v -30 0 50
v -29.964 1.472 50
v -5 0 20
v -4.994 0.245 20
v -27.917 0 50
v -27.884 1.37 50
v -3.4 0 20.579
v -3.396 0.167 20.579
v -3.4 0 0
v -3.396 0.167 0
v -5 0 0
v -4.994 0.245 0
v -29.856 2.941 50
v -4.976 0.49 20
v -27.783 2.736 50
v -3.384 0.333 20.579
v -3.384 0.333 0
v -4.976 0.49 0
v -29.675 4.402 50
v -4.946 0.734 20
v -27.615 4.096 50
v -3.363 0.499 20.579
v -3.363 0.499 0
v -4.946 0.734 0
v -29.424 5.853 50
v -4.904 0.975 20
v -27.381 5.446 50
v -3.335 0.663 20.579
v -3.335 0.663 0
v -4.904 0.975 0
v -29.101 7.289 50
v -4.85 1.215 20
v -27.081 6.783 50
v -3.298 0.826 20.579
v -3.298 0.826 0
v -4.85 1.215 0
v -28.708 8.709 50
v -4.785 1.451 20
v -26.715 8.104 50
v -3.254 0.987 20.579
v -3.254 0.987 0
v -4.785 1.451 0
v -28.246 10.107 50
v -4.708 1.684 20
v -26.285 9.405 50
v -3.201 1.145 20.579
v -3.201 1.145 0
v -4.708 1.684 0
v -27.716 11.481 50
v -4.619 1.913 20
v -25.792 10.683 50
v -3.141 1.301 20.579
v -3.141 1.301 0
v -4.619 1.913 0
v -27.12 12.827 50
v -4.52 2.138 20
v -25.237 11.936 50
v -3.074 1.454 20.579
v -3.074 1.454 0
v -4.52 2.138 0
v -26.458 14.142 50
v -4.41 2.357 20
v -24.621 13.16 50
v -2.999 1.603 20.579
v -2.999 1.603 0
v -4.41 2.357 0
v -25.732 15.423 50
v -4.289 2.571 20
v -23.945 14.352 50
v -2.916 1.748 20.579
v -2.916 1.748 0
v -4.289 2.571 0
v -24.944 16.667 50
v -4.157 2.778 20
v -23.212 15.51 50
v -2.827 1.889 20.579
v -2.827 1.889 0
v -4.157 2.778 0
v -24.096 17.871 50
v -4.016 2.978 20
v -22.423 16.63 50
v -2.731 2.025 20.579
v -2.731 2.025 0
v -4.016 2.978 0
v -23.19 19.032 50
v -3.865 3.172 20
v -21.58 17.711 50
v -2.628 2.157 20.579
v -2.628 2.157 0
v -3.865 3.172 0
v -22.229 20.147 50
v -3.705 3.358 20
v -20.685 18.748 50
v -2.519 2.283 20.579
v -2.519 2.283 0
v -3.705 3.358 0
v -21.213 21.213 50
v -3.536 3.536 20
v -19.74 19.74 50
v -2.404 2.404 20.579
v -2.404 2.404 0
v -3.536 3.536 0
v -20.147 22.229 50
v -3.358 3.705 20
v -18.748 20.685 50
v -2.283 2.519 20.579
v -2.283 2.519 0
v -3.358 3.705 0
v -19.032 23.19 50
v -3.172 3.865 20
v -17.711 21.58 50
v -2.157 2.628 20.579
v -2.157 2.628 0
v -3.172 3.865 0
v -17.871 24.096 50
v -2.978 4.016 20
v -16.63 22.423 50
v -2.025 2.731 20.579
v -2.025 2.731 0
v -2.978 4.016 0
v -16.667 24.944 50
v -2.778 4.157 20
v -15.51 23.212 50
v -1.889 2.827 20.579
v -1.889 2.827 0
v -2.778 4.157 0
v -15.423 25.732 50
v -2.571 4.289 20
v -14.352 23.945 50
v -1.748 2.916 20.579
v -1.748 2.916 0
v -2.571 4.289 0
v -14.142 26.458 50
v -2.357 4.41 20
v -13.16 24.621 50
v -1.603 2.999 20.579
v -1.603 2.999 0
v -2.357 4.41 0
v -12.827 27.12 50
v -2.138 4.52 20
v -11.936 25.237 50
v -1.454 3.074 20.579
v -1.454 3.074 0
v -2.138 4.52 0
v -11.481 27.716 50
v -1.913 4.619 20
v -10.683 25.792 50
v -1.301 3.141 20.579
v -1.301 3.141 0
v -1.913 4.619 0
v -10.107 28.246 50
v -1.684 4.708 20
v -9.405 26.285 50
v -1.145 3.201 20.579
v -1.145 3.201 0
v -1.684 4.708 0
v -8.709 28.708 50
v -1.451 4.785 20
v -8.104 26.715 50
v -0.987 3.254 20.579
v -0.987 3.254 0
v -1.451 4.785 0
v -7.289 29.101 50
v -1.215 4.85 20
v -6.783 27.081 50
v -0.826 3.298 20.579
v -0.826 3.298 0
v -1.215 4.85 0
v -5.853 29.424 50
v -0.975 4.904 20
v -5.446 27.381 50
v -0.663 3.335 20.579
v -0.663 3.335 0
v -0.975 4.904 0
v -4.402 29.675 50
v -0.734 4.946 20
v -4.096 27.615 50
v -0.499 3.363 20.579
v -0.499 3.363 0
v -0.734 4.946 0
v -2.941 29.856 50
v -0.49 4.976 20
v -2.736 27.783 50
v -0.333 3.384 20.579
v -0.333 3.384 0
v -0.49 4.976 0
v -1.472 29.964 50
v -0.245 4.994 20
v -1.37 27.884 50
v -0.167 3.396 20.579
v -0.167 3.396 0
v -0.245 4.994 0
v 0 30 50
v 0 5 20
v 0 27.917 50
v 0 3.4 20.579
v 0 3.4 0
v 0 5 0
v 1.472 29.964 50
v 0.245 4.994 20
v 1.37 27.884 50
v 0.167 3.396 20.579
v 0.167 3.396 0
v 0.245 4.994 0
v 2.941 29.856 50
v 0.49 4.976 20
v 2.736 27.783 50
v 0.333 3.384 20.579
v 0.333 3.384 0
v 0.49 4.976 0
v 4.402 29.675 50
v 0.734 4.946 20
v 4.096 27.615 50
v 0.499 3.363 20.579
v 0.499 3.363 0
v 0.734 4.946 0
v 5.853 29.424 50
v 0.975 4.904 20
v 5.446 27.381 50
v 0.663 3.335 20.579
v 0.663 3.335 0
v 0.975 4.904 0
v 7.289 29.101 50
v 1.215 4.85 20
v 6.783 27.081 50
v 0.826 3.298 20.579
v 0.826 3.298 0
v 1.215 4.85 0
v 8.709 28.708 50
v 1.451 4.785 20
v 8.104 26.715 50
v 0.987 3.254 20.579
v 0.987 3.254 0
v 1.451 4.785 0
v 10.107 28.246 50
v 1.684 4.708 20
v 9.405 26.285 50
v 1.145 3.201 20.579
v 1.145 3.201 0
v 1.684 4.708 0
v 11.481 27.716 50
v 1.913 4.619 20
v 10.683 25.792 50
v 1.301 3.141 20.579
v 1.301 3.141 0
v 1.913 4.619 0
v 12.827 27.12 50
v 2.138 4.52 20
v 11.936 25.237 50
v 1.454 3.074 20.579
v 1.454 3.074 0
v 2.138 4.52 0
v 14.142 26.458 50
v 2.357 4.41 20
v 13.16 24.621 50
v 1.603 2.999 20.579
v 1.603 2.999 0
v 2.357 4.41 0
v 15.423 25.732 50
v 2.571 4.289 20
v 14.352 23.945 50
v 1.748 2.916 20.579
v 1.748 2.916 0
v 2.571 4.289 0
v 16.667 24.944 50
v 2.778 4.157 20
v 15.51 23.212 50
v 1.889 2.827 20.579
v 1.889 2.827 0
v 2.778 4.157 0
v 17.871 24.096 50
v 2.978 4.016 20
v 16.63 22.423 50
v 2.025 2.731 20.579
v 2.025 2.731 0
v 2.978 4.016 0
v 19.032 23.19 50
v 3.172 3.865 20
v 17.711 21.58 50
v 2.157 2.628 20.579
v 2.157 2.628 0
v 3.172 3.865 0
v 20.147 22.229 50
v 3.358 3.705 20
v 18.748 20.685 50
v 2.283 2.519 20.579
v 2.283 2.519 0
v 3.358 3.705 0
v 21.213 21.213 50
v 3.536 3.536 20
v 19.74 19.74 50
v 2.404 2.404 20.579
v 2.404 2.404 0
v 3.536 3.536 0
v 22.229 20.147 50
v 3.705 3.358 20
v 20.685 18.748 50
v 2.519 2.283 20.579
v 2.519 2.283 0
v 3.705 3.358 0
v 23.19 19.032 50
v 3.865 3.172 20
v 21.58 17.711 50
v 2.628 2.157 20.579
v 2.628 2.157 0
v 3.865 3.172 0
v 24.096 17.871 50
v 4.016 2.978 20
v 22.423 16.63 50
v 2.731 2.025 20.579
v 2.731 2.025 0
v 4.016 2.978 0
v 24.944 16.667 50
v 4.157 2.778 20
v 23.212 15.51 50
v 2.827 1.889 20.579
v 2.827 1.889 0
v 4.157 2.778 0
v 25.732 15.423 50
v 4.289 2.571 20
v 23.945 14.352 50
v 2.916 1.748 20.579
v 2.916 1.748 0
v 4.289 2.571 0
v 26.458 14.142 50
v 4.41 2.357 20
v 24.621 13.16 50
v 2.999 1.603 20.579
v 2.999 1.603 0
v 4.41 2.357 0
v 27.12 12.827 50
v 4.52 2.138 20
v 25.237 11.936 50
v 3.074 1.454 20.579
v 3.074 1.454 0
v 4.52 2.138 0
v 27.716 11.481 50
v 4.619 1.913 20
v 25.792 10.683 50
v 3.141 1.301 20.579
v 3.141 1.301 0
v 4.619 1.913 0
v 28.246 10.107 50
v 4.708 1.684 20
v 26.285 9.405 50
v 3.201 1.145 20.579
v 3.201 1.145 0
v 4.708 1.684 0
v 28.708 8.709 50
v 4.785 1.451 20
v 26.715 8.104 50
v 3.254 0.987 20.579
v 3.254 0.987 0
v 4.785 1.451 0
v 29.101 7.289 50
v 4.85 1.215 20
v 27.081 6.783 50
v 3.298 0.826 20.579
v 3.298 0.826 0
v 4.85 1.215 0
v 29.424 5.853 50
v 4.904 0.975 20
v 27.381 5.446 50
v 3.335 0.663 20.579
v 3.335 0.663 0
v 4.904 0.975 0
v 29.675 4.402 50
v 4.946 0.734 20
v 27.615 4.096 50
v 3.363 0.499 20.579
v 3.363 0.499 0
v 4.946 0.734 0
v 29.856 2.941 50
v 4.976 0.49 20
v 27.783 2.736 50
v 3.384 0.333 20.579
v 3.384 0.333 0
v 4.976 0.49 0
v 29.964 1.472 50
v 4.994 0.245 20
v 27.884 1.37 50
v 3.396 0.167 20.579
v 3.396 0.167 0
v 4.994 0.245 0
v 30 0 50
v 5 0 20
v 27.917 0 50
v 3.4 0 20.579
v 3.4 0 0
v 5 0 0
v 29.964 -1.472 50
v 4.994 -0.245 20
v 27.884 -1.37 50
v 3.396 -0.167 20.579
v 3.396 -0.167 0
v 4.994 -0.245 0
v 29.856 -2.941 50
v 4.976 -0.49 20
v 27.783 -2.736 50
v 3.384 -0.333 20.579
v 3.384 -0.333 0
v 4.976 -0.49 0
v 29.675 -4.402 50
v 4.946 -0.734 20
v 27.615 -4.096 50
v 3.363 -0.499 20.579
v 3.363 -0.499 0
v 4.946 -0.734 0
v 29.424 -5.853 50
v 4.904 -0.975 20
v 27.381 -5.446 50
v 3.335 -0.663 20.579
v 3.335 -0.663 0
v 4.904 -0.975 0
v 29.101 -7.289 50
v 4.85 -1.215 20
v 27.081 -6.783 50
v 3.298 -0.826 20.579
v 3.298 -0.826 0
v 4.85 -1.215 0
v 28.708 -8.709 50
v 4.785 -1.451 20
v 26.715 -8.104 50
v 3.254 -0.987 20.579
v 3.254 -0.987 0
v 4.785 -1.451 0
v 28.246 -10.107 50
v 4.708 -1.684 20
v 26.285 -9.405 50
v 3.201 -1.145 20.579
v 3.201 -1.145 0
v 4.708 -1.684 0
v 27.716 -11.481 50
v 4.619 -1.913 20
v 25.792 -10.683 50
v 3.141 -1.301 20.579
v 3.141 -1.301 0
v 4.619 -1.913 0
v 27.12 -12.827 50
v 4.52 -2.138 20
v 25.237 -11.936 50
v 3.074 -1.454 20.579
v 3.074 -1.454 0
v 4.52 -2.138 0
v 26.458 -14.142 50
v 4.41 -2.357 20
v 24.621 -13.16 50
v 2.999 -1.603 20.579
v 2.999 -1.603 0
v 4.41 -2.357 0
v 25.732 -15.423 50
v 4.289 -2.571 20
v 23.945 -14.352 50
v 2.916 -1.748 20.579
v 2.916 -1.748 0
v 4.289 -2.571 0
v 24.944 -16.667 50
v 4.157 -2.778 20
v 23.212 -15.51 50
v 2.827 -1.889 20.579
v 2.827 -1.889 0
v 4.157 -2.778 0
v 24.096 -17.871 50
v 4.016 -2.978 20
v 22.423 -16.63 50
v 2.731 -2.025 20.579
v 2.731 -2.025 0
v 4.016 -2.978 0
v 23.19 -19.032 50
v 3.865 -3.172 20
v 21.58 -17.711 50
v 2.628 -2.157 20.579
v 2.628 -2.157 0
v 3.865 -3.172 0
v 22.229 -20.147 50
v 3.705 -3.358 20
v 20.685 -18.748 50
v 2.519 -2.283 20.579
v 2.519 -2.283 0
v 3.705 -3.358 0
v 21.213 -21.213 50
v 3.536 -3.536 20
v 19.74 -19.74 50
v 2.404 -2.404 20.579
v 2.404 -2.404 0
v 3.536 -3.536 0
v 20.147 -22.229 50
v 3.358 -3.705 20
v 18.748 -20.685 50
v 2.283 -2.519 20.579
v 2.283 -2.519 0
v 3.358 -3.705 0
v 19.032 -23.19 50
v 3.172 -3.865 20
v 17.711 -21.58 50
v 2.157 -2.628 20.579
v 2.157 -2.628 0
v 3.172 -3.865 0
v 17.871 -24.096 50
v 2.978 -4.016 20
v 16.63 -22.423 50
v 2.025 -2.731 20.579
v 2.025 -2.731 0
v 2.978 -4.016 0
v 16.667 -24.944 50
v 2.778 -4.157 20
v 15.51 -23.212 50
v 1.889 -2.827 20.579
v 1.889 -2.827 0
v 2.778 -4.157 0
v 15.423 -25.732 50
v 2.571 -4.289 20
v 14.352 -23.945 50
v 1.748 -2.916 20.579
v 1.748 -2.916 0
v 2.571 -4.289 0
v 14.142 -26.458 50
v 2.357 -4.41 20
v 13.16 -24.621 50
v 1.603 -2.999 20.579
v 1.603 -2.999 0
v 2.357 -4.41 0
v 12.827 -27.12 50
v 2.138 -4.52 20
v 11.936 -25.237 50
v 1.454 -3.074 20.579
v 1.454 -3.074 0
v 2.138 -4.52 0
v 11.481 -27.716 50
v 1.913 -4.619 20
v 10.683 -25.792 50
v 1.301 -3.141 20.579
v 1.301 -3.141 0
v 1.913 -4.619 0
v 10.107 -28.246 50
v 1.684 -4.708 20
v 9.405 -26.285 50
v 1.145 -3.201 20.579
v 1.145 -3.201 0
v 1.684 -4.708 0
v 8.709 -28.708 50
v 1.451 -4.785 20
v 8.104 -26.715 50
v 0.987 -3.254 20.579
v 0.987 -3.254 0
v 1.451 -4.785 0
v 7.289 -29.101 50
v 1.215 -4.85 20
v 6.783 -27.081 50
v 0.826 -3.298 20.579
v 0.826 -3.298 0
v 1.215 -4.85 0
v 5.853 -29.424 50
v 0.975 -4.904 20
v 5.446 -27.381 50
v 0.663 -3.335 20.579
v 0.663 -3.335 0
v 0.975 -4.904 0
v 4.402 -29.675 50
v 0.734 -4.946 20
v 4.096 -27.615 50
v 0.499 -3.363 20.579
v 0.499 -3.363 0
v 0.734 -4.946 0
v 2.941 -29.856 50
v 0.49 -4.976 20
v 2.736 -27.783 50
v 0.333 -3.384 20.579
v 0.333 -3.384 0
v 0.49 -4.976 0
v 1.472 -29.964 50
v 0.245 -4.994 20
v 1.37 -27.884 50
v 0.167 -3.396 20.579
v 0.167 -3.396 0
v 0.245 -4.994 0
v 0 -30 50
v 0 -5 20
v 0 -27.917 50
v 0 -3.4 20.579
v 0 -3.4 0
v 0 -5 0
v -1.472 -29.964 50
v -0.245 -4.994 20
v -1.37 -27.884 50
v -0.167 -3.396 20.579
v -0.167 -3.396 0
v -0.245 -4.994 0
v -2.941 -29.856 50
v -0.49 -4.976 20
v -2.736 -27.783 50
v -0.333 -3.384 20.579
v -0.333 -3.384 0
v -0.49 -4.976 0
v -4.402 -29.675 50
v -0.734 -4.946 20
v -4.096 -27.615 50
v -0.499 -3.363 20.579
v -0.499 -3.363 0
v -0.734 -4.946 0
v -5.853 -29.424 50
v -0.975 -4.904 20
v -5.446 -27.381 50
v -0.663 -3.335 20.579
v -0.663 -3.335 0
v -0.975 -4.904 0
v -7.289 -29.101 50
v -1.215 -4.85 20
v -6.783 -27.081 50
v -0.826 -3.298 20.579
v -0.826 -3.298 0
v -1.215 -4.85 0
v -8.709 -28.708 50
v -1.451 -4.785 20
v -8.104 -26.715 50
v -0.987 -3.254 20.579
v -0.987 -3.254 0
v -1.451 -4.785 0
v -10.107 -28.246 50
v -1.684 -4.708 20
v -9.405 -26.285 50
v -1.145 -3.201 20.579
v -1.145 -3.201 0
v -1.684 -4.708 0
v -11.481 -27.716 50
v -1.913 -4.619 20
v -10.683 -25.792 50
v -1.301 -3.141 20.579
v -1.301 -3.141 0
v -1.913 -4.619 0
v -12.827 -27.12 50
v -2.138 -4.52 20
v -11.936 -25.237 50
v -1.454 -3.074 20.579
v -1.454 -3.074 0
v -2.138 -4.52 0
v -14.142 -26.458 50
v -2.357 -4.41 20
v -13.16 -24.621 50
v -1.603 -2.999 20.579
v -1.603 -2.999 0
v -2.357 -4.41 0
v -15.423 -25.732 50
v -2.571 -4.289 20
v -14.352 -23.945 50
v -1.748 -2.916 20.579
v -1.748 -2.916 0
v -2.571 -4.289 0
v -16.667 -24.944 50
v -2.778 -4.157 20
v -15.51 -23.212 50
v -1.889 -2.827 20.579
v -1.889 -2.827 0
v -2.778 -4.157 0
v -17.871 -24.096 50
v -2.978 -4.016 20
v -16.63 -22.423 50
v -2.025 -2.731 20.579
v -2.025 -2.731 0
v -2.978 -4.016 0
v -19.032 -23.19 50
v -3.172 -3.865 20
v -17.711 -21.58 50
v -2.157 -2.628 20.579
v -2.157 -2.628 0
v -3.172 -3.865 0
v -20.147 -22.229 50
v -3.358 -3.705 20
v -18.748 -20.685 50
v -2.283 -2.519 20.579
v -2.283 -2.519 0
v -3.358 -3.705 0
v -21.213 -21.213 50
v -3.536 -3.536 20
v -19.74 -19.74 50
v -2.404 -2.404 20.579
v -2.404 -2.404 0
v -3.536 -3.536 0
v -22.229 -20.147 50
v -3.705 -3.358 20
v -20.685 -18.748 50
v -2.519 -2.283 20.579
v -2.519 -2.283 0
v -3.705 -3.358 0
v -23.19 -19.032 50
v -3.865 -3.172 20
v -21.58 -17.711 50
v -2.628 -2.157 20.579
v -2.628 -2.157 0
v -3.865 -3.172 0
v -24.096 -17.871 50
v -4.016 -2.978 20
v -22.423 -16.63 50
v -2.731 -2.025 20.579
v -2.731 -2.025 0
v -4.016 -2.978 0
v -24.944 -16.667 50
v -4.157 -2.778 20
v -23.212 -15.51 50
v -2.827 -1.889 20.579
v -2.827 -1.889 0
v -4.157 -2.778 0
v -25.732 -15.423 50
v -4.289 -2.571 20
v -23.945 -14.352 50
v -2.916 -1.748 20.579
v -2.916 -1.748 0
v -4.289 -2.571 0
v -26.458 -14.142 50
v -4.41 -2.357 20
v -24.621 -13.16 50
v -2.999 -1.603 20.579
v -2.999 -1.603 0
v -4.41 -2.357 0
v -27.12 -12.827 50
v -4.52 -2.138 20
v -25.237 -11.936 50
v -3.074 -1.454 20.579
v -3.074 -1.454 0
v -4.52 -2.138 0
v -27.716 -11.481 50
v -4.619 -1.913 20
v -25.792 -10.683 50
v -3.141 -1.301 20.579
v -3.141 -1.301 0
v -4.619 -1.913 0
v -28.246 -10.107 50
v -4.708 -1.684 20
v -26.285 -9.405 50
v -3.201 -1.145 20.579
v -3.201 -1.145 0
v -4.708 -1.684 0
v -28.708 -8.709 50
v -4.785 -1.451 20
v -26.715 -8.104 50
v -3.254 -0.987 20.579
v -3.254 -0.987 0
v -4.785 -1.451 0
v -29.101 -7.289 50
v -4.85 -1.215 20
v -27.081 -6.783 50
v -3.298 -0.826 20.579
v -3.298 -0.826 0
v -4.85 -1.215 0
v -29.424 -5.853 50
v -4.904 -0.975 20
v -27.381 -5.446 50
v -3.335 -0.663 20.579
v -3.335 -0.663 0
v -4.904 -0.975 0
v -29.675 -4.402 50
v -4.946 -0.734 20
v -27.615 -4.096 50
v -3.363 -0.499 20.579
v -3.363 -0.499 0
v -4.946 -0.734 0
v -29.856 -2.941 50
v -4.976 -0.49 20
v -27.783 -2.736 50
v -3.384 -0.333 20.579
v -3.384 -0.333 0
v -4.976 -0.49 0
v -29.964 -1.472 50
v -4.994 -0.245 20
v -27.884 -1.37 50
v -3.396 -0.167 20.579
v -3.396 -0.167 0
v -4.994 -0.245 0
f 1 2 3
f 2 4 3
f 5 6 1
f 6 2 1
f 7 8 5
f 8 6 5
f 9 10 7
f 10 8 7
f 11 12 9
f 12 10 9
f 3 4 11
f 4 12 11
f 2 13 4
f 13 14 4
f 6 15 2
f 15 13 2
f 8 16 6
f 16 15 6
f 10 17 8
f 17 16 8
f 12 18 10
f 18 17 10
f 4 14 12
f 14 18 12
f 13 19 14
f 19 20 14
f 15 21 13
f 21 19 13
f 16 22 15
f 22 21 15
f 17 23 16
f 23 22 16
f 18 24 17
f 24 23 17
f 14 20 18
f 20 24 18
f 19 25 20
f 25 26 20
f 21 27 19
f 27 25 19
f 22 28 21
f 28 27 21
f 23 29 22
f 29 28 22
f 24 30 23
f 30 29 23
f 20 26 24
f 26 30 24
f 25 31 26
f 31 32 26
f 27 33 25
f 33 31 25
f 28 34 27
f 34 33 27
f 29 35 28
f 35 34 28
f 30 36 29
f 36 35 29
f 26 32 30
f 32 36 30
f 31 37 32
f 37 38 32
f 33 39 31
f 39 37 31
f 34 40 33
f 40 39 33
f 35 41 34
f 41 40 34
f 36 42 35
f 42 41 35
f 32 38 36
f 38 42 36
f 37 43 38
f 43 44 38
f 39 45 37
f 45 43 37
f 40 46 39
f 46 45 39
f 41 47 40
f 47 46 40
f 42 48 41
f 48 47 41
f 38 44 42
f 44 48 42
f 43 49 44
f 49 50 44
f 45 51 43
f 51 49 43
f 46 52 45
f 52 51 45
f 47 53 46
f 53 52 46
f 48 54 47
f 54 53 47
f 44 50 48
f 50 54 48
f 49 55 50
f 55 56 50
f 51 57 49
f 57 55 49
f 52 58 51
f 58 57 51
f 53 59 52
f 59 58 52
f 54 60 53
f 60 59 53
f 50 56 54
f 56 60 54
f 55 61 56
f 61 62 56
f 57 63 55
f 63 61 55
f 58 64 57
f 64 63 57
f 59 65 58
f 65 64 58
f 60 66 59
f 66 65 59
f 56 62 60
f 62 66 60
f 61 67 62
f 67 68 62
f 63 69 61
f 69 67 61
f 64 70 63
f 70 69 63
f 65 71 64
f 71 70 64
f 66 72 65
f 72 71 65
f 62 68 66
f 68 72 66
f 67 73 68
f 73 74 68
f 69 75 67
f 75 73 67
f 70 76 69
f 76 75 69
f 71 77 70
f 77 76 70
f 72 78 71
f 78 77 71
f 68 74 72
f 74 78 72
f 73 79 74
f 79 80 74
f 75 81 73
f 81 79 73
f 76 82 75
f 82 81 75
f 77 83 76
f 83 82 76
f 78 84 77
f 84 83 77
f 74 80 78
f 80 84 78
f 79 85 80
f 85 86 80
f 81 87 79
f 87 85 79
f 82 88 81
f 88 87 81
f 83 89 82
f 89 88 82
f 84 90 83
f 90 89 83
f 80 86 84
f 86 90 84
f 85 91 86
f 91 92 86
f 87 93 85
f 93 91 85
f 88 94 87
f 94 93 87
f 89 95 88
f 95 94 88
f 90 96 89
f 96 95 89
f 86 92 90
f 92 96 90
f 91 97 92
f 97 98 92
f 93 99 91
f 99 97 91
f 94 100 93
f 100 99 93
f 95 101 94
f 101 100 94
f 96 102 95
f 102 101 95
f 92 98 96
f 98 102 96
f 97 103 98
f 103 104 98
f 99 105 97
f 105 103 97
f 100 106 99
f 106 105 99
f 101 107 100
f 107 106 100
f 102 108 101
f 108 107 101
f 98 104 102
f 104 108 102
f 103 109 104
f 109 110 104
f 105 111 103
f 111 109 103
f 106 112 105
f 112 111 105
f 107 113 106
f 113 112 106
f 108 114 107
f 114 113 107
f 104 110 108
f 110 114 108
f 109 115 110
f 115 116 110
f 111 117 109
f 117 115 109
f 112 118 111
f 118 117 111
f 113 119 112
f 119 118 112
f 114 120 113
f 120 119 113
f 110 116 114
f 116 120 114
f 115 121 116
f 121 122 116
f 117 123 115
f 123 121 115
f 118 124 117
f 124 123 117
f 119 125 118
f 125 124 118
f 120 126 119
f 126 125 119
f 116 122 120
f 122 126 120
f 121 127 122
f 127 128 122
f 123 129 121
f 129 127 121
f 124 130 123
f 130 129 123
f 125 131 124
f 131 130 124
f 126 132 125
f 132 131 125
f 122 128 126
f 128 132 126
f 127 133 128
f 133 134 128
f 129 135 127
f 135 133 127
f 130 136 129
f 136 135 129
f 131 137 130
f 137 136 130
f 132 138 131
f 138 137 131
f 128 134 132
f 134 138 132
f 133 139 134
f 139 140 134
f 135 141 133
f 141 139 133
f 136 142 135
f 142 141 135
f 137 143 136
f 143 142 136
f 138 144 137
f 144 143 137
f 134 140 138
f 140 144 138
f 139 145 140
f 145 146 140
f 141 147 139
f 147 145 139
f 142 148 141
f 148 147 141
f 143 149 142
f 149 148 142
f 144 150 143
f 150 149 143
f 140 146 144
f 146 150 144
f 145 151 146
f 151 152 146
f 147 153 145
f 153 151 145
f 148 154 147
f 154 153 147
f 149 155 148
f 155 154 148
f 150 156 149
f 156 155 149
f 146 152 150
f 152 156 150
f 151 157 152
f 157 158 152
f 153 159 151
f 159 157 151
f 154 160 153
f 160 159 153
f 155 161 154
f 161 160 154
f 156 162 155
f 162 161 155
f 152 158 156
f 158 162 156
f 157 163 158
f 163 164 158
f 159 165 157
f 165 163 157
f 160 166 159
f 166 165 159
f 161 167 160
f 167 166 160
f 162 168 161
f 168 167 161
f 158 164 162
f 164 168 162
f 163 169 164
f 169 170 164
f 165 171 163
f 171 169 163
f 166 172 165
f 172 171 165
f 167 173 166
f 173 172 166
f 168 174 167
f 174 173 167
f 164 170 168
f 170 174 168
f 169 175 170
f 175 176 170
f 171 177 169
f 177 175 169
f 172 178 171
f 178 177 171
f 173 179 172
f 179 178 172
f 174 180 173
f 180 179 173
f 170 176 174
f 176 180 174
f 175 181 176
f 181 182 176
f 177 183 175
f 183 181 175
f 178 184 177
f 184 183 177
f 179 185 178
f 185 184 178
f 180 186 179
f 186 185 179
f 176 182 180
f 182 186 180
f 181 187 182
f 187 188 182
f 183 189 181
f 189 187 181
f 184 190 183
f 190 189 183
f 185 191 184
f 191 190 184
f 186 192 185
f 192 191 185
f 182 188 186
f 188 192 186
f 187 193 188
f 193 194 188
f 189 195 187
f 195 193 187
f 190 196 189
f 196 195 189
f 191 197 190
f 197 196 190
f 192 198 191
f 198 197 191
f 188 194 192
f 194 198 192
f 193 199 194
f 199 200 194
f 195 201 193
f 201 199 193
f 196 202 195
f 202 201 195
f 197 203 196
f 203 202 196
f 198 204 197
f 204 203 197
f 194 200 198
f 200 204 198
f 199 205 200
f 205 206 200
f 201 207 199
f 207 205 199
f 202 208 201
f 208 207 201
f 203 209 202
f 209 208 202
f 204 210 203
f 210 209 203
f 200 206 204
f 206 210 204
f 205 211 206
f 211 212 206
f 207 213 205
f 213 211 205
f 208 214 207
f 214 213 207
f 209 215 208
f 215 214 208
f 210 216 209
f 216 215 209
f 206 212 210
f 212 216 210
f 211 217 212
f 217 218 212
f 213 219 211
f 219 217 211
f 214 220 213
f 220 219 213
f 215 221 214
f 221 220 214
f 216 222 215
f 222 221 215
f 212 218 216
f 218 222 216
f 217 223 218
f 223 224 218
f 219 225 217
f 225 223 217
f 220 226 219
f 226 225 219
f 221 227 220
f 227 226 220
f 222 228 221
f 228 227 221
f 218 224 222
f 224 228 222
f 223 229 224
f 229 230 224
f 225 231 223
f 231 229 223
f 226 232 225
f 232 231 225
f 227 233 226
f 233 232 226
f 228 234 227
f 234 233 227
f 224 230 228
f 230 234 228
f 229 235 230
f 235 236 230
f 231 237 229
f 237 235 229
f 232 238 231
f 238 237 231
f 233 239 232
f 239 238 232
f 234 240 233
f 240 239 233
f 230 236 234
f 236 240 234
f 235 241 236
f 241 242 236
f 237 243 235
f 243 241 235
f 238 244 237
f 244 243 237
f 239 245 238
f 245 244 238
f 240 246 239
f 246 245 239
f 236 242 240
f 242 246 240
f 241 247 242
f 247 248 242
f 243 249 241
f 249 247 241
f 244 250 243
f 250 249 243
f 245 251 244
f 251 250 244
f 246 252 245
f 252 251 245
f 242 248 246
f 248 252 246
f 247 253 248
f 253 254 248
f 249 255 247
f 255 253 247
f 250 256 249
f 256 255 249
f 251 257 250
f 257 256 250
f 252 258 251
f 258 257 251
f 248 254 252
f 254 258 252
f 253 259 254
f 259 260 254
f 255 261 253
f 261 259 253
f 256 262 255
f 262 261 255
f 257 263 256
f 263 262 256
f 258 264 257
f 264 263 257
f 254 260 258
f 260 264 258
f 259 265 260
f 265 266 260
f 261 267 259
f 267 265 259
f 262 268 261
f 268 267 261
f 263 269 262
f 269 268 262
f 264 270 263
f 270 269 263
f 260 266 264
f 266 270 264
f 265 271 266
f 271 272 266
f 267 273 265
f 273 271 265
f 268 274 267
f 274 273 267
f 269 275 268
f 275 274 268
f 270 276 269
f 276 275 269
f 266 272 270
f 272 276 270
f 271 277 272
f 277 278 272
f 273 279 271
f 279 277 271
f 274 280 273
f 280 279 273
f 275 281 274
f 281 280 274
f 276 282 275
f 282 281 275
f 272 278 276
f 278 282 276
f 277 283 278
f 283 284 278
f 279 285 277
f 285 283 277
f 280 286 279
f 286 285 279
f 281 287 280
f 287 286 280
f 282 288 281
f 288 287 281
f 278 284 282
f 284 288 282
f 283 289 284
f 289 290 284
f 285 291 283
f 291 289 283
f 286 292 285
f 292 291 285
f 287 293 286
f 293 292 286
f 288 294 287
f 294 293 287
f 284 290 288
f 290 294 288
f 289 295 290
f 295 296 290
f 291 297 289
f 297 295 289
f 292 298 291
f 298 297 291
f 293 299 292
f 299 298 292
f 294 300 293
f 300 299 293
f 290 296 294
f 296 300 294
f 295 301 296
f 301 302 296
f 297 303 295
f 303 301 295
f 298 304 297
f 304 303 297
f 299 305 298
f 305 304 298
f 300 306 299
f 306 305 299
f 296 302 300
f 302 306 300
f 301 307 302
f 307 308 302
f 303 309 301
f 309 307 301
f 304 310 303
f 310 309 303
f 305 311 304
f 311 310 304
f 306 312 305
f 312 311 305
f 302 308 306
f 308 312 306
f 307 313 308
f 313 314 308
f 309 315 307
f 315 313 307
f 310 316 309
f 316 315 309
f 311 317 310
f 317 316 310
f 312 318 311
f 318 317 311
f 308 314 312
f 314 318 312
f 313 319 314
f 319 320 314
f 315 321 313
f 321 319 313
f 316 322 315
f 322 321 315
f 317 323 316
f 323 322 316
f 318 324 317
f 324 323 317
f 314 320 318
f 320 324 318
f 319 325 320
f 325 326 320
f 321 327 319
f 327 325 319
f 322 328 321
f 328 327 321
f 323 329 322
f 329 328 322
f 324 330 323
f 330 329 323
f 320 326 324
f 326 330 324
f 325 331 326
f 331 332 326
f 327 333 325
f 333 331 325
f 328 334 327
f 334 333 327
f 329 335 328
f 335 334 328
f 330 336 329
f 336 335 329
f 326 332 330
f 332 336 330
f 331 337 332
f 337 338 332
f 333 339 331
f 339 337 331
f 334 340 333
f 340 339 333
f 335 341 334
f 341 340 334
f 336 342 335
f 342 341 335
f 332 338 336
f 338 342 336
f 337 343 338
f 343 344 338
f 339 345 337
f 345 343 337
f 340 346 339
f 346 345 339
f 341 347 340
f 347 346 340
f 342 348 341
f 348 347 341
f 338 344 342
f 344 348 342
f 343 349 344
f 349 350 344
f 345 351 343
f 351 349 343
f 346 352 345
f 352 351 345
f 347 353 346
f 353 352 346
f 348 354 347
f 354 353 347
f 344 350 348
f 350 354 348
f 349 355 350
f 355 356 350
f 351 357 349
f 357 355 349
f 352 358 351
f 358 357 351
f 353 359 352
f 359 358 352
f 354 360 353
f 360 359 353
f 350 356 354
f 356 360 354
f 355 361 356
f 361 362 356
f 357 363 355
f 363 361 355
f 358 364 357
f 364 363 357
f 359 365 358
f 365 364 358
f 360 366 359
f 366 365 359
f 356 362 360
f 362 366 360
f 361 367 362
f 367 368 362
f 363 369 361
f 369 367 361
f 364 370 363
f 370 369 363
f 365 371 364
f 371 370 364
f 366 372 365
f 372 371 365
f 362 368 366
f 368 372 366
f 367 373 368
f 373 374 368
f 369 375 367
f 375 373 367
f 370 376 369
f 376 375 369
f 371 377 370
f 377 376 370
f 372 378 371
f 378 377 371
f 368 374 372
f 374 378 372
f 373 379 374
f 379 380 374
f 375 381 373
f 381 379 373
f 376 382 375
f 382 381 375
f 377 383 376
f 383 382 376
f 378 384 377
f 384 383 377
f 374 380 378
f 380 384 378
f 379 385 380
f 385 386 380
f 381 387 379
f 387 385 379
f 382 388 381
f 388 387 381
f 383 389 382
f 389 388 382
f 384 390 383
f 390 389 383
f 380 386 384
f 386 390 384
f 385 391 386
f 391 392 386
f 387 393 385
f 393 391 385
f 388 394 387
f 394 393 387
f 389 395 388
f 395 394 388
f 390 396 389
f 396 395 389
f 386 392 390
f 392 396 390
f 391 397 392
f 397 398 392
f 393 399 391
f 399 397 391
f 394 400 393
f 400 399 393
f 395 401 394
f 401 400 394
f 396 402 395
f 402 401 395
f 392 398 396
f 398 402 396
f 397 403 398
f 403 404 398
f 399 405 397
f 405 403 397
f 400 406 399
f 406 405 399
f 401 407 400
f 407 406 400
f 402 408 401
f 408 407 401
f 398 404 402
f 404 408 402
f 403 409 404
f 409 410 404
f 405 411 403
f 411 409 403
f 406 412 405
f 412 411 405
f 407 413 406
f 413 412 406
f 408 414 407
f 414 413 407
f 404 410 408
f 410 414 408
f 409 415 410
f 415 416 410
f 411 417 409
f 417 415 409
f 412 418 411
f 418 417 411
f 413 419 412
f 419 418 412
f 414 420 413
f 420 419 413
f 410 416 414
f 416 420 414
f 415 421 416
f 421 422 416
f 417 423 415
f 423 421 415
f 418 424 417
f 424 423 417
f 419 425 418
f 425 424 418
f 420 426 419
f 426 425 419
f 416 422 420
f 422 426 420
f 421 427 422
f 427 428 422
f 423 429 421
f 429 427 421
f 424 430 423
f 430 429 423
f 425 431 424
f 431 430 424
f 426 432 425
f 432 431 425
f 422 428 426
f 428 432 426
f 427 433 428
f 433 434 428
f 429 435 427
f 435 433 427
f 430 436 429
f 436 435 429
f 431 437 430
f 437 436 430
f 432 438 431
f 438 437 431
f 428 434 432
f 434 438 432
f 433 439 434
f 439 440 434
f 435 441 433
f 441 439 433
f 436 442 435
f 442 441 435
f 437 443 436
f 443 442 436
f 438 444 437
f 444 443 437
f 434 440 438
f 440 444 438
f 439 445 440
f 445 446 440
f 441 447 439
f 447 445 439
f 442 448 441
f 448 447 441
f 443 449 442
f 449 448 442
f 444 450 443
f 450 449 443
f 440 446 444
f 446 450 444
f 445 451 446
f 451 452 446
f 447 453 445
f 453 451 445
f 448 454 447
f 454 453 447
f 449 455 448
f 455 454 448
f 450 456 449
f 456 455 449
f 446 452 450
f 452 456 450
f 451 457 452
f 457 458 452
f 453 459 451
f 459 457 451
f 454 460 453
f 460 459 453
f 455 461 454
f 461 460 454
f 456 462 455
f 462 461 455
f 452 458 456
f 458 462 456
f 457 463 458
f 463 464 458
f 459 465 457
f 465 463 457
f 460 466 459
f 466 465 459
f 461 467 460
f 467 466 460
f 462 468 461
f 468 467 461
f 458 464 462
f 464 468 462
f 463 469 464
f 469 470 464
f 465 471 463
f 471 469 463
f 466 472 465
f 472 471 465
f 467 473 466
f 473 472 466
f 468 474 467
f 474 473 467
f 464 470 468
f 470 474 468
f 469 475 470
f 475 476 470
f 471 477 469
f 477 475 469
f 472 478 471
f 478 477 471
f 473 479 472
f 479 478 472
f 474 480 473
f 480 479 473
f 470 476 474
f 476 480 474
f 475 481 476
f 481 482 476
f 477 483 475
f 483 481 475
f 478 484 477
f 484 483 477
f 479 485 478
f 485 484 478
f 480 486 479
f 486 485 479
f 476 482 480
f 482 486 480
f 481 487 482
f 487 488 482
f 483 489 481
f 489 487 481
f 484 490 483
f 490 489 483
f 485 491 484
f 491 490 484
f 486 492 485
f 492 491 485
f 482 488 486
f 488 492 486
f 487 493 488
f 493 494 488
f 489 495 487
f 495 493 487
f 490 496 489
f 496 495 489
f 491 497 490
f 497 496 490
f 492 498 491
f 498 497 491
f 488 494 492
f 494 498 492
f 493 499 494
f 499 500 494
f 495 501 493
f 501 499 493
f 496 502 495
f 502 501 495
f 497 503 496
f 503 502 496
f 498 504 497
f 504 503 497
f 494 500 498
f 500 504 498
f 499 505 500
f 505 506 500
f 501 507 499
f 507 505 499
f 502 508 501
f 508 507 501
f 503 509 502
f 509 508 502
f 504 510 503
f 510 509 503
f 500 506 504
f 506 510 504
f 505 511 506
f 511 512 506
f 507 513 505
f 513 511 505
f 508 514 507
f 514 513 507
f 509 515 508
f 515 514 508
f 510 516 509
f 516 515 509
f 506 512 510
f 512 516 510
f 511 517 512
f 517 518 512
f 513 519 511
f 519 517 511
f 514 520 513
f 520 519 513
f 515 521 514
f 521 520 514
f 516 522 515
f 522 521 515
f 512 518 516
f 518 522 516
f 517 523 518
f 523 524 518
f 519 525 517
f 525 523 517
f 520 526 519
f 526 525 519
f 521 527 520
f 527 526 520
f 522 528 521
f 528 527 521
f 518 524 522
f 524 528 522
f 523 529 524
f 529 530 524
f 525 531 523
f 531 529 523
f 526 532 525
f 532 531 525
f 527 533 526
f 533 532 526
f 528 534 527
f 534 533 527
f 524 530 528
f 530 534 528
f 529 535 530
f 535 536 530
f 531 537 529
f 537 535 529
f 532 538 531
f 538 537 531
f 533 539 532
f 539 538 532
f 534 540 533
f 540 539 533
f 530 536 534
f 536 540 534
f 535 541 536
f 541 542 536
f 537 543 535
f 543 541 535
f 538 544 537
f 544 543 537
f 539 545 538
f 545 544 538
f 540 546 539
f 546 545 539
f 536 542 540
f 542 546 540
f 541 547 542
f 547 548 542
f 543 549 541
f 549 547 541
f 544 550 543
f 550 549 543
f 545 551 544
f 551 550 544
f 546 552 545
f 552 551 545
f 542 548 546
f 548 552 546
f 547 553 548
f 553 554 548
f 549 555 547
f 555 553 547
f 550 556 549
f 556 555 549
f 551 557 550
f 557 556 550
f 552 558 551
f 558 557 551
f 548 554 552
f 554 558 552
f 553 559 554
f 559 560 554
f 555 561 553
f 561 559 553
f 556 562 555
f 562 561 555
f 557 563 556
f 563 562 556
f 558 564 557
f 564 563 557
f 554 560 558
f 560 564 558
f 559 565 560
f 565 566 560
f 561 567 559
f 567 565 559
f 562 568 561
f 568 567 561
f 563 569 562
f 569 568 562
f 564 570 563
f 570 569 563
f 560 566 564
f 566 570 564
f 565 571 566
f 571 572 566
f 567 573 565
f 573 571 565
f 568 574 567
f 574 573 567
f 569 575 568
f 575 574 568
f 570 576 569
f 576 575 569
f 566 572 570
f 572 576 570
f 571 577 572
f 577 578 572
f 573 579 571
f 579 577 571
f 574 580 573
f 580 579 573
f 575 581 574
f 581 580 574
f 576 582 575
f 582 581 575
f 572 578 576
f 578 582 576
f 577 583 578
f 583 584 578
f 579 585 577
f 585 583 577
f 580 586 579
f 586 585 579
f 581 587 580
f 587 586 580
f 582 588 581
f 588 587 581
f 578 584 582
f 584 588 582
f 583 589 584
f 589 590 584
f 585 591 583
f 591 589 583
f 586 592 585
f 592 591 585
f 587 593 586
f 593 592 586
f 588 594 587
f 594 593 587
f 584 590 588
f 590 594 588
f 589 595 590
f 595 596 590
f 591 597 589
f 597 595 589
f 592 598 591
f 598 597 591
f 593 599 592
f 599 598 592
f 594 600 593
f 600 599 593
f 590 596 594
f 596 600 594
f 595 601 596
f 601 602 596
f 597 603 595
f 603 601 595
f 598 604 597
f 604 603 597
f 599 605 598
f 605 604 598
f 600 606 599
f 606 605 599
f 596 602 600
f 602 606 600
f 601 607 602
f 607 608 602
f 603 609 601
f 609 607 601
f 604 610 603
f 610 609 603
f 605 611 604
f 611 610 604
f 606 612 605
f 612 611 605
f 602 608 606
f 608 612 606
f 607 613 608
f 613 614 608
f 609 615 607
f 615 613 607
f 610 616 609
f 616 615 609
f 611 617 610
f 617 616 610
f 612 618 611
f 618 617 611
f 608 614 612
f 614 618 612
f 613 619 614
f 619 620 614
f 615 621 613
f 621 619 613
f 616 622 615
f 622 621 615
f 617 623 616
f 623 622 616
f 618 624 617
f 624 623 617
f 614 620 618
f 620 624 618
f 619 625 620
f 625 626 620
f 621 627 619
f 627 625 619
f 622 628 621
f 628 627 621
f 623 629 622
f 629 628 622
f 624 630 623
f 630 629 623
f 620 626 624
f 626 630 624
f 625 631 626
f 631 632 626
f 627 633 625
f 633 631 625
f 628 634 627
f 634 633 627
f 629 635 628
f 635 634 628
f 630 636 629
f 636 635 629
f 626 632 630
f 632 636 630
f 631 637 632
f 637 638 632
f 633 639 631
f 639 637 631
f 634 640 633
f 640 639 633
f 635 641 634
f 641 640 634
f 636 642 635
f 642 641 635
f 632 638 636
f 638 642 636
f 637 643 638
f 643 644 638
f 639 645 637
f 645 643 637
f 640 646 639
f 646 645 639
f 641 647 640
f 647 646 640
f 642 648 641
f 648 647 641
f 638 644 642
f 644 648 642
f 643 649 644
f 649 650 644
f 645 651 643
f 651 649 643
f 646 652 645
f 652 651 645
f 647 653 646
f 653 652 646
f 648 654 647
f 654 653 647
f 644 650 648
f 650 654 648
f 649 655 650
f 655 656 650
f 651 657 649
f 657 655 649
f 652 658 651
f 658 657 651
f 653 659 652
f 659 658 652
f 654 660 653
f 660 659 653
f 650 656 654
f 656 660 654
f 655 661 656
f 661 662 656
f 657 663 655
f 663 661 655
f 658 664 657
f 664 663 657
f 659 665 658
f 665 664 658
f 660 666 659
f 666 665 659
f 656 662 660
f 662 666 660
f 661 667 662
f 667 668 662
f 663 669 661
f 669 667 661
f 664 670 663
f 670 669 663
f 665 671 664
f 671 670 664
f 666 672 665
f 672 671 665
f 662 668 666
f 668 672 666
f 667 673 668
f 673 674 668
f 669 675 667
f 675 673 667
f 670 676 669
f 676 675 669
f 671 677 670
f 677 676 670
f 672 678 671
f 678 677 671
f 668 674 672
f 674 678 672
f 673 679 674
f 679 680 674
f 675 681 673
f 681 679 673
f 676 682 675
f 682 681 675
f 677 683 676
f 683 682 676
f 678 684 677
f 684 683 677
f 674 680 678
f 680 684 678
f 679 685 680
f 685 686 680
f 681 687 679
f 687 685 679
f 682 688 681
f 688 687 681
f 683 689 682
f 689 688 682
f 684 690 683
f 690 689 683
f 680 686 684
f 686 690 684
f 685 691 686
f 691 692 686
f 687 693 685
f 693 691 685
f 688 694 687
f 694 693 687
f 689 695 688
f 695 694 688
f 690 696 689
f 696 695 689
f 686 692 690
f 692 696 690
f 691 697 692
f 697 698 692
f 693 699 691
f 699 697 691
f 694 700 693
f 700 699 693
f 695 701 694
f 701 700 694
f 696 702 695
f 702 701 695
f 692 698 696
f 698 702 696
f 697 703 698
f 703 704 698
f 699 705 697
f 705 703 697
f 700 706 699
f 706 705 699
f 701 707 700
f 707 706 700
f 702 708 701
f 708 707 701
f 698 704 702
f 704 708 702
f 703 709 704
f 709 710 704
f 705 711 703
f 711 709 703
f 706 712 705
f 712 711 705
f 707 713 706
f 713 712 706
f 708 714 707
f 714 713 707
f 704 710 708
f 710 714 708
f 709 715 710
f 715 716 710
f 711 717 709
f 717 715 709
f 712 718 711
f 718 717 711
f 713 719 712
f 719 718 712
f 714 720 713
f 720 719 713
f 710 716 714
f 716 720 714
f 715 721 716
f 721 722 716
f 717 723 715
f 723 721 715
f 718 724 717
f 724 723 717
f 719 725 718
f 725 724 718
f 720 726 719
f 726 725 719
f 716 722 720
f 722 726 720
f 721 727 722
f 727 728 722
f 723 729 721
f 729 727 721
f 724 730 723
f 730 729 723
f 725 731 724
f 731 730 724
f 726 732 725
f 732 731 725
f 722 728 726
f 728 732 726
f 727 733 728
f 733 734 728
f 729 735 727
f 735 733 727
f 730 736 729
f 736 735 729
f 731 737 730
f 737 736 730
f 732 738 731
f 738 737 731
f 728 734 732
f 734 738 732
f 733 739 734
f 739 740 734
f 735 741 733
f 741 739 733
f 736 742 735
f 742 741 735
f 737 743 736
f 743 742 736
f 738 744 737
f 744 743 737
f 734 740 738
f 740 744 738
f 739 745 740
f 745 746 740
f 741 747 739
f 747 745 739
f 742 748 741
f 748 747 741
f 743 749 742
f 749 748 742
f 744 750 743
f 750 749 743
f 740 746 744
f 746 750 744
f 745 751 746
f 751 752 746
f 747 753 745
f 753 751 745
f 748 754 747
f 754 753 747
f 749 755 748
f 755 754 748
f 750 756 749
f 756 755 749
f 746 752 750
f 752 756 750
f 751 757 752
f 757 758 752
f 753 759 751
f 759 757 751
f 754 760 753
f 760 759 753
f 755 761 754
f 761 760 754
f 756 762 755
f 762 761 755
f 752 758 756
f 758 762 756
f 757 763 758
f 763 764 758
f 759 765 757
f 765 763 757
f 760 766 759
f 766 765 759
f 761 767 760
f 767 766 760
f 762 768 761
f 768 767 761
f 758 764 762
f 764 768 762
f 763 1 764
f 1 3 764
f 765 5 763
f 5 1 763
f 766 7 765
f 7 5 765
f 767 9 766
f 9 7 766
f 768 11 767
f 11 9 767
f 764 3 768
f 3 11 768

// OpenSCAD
// Small lab funnel - printed upright, wide opening at top
// Built as a single rotate_extrude of the wall cross-section,
// so the funnel is open at both ends.

$fn = 128;                 // smoothness of round surfaces

// ---------------- Dimensions (mm) ----------------
spout_od      = 10;        // spout outer diameter
spout_h       = 20;        // spout height (z = 0 .. 20)
rim_od        = 60;        // cone outer diameter at rim
rim_z         = 50;        // rim height
wall          = 1.6;       // wall thickness (normal to surface)

// ---------------- Derived values ----------------
spout_r       = spout_od / 2;                 // 5.0  outer spout radius
bore_r        = spout_r - wall;               // 3.4  spout bore radius (6.8 mm bore)
rim_r         = rim_od / 2;                   // 30.0 outer rim radius
cone_h        = rim_z - spout_h;              // 30.0 cone height
cone_k        = (rim_r - spout_r) / cone_h;   // radial growth per mm of height
// Horizontal offset that gives a true 1.6 mm wall perpendicular to the cone side
cone_off      = wall * sqrt(1 + cone_k * cone_k);
// Height where the inner cone surface meets the spout bore
join_z        = spout_h + (cone_off - wall) / cone_k;
rim_inner_r   = rim_r - cone_off;             // inner radius at rim

// ---------------- Model ----------------
rotate_extrude(convexity = 4)
    polygon(points = [
        [bore_r,      0],        // bottom of bore
        [spout_r,     0],        // bottom outer edge of spout
        [spout_r,     spout_h],  // top of straight spout (outer)
        [rim_r,       rim_z],    // outer rim
        [rim_inner_r, rim_z],    // inner rim
        [bore_r,      join_z]    // inner cone meets bore
    ]);
